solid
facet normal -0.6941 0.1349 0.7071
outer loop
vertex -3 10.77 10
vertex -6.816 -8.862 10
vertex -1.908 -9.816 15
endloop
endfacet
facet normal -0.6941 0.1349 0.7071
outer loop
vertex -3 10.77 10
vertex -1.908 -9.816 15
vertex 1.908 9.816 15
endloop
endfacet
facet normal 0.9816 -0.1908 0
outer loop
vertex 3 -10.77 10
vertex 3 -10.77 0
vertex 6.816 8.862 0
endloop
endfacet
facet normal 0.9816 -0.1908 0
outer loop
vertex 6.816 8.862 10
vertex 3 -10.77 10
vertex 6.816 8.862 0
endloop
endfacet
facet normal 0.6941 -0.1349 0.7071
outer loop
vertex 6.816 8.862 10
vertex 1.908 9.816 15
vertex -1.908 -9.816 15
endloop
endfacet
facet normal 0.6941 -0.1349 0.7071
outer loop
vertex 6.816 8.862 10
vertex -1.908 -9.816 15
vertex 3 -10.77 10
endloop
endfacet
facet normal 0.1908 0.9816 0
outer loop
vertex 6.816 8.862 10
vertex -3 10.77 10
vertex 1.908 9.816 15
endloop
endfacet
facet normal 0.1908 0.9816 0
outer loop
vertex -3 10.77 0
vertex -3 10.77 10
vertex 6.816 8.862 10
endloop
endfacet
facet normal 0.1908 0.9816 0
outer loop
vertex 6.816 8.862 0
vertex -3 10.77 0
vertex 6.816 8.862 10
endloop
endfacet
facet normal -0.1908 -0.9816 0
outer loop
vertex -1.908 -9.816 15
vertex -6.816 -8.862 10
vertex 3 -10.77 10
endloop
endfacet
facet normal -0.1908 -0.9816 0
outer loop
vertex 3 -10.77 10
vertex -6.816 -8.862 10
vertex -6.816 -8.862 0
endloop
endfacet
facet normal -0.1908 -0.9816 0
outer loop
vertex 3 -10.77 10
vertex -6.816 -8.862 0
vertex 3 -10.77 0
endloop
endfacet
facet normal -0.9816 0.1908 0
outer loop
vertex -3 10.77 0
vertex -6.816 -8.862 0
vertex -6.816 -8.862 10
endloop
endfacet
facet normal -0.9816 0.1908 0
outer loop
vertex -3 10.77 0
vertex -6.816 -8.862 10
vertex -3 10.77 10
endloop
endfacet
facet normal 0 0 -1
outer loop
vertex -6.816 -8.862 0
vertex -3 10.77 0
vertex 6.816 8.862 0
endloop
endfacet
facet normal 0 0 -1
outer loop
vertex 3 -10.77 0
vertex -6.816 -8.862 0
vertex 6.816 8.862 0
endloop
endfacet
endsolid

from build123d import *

# Parameters (mm, degrees)
BOX_W                  = 7.071
BOX_H                  = 20
BOX_DEPTH              = 7.071
BOX_PITCH_ANGLE        = 45
BOX_PLACEMENT_ANGLE    = -11
BOX001_W               = 10
BOX001_H               = 20
BOX001_DEPTH           = 10
BOX001_PLACEMENT_ANGLE = 349


with BuildPart() as cub:
    # Box → Box (new body)
    with BuildSketch(Plane.XY):
        with Locations((3.5355, 10)):
            Rectangle(BOX_W, BOX_H)
    extrude(amount=BOX_DEPTH)


with BuildPart() as cub_1:
    # Box pitch: moved
    add(cub.part.rotate(Axis((0, 0, 0), (0, 1, 0)), BOX_PITCH_ANGLE))


with BuildPart() as cub_2:
    # Box placement: moved
    add(cub_1.part.moved(Location((-6.816226, -8.862227, 10))).rotate(Axis((-6.816226, -8.862227, 10), (0, 0, 1)), BOX_PLACEMENT_ANGLE))


with BuildPart() as fusion:
    # Box001 → Box001 (new body)
    with BuildSketch(Plane.XY):
        with Locations((5, 10)):
            Rectangle(BOX001_W, BOX001_H)
    extrude(amount=BOX001_DEPTH)


with BuildPart() as fusion_1:
    # Box001 placement: moved
    add(fusion.part.moved(Location((-6.816226, -8.862227, 0))).rotate(Axis((-6.816226, -8.862227, 0), (0, 0, 1)), BOX001_PLACEMENT_ANGLE))

    # Fusion: union Cub
    add(cub_2.part)


solid = fusion_1.part
